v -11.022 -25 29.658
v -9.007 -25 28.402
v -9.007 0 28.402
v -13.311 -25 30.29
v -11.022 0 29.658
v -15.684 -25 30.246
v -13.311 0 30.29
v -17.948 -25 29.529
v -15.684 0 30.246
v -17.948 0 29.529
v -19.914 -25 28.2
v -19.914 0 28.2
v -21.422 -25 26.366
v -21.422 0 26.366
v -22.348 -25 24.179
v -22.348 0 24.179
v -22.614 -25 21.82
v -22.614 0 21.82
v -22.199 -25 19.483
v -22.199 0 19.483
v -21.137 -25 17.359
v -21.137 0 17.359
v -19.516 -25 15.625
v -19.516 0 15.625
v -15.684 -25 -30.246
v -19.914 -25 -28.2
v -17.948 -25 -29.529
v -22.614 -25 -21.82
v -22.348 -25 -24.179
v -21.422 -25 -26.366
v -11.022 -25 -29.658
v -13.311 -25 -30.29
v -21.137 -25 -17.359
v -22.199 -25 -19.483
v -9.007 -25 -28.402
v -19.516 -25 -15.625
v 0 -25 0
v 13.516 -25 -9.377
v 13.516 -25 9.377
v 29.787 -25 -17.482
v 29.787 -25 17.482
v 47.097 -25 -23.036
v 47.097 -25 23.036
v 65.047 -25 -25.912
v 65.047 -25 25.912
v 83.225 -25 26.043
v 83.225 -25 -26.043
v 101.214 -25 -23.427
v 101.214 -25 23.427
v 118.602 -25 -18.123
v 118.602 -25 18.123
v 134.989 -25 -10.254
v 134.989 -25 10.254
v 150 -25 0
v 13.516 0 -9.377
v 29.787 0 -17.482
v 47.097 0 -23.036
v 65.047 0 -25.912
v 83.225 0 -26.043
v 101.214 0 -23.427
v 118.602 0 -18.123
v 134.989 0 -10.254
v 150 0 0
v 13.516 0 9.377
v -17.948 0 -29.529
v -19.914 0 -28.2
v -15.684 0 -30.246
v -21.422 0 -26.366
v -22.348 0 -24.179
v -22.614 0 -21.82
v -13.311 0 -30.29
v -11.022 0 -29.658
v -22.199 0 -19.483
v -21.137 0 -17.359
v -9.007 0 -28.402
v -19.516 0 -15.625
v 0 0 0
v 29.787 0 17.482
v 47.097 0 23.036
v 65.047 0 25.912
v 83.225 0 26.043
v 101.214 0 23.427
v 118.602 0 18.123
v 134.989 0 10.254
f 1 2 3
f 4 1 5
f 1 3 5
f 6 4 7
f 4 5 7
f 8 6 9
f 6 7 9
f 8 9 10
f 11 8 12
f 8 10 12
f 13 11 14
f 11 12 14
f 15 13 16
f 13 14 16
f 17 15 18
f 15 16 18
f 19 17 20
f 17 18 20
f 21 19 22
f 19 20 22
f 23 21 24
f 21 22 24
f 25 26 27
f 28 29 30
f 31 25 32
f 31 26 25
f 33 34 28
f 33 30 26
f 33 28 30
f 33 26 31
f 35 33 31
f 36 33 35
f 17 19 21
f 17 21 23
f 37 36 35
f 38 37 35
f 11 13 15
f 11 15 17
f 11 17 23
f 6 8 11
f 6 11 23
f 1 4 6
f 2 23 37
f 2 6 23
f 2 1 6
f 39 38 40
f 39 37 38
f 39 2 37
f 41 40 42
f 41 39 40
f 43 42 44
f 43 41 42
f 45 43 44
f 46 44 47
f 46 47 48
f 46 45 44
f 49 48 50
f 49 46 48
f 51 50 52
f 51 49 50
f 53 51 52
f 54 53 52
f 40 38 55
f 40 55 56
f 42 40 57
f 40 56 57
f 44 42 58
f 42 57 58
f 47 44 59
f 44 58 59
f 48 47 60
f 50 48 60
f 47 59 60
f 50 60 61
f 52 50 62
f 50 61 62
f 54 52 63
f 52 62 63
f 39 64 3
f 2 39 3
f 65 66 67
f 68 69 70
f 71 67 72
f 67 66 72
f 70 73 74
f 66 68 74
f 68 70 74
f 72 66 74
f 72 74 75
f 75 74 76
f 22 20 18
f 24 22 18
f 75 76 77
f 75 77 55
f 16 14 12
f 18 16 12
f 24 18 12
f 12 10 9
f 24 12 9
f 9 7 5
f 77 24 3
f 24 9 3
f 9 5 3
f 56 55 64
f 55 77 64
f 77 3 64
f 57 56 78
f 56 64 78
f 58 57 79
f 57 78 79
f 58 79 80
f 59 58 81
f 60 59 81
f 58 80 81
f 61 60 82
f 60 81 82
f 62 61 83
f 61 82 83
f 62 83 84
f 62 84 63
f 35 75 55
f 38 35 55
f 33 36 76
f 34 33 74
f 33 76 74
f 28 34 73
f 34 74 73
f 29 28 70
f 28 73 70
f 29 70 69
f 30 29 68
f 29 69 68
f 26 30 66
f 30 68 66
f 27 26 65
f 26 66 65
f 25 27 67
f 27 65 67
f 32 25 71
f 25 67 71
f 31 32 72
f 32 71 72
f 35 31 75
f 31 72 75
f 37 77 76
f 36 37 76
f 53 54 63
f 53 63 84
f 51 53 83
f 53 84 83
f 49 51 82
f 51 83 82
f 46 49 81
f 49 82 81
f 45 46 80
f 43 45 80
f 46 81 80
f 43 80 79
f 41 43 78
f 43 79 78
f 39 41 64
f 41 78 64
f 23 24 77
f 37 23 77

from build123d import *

# Parameters (mm, degrees)
F1_DEPTH = 25


with BuildPart() as f1:
    # F0 (on Front) → F1 (new body)
    with BuildSketch(Plane.XZ):
        with BuildLine():
            ThreePointArc((13.51559, -9.3768), (83.224894, -26.042828), (150, 0))
            ThreePointArc((150, 0), (83.224894, 26.042828), (13.51559, 9.3768))
            ThreePointArc((13.51559, 9.3768), (6.596932, 4.920265), (0, 0))
            ThreePointArc((0, 0), (6.596932, -4.920265), (13.51559, -9.3768))
        make_face()
        with BuildLine():
            ThreePointArc((0, 0), (6.596932, 4.920265), (13.51559, 9.3768))
            Line((13.51559, 9.3768), (-9.007419, 28.40198))
            ThreePointArc((-9.007419, 28.40198), (-20.734502, 27.33708), (-19.515619, 15.625))
            Line((-19.515619, 15.625), (0, 0))
        make_face()
        with BuildLine():
            Line((-9.007419, -28.40198), (13.51559, -9.3768))
            ThreePointArc((13.51559, -9.3768), (6.596932, -4.920265), (0, 0))
            Line((0, 0), (-19.515619, -15.625))
            ThreePointArc((-19.515619, -15.625), (-20.734502, -27.33708), (-9.007419, -28.40198))
        make_face()
    extrude(amount=F1_DEPTH)


solid = f1.part
